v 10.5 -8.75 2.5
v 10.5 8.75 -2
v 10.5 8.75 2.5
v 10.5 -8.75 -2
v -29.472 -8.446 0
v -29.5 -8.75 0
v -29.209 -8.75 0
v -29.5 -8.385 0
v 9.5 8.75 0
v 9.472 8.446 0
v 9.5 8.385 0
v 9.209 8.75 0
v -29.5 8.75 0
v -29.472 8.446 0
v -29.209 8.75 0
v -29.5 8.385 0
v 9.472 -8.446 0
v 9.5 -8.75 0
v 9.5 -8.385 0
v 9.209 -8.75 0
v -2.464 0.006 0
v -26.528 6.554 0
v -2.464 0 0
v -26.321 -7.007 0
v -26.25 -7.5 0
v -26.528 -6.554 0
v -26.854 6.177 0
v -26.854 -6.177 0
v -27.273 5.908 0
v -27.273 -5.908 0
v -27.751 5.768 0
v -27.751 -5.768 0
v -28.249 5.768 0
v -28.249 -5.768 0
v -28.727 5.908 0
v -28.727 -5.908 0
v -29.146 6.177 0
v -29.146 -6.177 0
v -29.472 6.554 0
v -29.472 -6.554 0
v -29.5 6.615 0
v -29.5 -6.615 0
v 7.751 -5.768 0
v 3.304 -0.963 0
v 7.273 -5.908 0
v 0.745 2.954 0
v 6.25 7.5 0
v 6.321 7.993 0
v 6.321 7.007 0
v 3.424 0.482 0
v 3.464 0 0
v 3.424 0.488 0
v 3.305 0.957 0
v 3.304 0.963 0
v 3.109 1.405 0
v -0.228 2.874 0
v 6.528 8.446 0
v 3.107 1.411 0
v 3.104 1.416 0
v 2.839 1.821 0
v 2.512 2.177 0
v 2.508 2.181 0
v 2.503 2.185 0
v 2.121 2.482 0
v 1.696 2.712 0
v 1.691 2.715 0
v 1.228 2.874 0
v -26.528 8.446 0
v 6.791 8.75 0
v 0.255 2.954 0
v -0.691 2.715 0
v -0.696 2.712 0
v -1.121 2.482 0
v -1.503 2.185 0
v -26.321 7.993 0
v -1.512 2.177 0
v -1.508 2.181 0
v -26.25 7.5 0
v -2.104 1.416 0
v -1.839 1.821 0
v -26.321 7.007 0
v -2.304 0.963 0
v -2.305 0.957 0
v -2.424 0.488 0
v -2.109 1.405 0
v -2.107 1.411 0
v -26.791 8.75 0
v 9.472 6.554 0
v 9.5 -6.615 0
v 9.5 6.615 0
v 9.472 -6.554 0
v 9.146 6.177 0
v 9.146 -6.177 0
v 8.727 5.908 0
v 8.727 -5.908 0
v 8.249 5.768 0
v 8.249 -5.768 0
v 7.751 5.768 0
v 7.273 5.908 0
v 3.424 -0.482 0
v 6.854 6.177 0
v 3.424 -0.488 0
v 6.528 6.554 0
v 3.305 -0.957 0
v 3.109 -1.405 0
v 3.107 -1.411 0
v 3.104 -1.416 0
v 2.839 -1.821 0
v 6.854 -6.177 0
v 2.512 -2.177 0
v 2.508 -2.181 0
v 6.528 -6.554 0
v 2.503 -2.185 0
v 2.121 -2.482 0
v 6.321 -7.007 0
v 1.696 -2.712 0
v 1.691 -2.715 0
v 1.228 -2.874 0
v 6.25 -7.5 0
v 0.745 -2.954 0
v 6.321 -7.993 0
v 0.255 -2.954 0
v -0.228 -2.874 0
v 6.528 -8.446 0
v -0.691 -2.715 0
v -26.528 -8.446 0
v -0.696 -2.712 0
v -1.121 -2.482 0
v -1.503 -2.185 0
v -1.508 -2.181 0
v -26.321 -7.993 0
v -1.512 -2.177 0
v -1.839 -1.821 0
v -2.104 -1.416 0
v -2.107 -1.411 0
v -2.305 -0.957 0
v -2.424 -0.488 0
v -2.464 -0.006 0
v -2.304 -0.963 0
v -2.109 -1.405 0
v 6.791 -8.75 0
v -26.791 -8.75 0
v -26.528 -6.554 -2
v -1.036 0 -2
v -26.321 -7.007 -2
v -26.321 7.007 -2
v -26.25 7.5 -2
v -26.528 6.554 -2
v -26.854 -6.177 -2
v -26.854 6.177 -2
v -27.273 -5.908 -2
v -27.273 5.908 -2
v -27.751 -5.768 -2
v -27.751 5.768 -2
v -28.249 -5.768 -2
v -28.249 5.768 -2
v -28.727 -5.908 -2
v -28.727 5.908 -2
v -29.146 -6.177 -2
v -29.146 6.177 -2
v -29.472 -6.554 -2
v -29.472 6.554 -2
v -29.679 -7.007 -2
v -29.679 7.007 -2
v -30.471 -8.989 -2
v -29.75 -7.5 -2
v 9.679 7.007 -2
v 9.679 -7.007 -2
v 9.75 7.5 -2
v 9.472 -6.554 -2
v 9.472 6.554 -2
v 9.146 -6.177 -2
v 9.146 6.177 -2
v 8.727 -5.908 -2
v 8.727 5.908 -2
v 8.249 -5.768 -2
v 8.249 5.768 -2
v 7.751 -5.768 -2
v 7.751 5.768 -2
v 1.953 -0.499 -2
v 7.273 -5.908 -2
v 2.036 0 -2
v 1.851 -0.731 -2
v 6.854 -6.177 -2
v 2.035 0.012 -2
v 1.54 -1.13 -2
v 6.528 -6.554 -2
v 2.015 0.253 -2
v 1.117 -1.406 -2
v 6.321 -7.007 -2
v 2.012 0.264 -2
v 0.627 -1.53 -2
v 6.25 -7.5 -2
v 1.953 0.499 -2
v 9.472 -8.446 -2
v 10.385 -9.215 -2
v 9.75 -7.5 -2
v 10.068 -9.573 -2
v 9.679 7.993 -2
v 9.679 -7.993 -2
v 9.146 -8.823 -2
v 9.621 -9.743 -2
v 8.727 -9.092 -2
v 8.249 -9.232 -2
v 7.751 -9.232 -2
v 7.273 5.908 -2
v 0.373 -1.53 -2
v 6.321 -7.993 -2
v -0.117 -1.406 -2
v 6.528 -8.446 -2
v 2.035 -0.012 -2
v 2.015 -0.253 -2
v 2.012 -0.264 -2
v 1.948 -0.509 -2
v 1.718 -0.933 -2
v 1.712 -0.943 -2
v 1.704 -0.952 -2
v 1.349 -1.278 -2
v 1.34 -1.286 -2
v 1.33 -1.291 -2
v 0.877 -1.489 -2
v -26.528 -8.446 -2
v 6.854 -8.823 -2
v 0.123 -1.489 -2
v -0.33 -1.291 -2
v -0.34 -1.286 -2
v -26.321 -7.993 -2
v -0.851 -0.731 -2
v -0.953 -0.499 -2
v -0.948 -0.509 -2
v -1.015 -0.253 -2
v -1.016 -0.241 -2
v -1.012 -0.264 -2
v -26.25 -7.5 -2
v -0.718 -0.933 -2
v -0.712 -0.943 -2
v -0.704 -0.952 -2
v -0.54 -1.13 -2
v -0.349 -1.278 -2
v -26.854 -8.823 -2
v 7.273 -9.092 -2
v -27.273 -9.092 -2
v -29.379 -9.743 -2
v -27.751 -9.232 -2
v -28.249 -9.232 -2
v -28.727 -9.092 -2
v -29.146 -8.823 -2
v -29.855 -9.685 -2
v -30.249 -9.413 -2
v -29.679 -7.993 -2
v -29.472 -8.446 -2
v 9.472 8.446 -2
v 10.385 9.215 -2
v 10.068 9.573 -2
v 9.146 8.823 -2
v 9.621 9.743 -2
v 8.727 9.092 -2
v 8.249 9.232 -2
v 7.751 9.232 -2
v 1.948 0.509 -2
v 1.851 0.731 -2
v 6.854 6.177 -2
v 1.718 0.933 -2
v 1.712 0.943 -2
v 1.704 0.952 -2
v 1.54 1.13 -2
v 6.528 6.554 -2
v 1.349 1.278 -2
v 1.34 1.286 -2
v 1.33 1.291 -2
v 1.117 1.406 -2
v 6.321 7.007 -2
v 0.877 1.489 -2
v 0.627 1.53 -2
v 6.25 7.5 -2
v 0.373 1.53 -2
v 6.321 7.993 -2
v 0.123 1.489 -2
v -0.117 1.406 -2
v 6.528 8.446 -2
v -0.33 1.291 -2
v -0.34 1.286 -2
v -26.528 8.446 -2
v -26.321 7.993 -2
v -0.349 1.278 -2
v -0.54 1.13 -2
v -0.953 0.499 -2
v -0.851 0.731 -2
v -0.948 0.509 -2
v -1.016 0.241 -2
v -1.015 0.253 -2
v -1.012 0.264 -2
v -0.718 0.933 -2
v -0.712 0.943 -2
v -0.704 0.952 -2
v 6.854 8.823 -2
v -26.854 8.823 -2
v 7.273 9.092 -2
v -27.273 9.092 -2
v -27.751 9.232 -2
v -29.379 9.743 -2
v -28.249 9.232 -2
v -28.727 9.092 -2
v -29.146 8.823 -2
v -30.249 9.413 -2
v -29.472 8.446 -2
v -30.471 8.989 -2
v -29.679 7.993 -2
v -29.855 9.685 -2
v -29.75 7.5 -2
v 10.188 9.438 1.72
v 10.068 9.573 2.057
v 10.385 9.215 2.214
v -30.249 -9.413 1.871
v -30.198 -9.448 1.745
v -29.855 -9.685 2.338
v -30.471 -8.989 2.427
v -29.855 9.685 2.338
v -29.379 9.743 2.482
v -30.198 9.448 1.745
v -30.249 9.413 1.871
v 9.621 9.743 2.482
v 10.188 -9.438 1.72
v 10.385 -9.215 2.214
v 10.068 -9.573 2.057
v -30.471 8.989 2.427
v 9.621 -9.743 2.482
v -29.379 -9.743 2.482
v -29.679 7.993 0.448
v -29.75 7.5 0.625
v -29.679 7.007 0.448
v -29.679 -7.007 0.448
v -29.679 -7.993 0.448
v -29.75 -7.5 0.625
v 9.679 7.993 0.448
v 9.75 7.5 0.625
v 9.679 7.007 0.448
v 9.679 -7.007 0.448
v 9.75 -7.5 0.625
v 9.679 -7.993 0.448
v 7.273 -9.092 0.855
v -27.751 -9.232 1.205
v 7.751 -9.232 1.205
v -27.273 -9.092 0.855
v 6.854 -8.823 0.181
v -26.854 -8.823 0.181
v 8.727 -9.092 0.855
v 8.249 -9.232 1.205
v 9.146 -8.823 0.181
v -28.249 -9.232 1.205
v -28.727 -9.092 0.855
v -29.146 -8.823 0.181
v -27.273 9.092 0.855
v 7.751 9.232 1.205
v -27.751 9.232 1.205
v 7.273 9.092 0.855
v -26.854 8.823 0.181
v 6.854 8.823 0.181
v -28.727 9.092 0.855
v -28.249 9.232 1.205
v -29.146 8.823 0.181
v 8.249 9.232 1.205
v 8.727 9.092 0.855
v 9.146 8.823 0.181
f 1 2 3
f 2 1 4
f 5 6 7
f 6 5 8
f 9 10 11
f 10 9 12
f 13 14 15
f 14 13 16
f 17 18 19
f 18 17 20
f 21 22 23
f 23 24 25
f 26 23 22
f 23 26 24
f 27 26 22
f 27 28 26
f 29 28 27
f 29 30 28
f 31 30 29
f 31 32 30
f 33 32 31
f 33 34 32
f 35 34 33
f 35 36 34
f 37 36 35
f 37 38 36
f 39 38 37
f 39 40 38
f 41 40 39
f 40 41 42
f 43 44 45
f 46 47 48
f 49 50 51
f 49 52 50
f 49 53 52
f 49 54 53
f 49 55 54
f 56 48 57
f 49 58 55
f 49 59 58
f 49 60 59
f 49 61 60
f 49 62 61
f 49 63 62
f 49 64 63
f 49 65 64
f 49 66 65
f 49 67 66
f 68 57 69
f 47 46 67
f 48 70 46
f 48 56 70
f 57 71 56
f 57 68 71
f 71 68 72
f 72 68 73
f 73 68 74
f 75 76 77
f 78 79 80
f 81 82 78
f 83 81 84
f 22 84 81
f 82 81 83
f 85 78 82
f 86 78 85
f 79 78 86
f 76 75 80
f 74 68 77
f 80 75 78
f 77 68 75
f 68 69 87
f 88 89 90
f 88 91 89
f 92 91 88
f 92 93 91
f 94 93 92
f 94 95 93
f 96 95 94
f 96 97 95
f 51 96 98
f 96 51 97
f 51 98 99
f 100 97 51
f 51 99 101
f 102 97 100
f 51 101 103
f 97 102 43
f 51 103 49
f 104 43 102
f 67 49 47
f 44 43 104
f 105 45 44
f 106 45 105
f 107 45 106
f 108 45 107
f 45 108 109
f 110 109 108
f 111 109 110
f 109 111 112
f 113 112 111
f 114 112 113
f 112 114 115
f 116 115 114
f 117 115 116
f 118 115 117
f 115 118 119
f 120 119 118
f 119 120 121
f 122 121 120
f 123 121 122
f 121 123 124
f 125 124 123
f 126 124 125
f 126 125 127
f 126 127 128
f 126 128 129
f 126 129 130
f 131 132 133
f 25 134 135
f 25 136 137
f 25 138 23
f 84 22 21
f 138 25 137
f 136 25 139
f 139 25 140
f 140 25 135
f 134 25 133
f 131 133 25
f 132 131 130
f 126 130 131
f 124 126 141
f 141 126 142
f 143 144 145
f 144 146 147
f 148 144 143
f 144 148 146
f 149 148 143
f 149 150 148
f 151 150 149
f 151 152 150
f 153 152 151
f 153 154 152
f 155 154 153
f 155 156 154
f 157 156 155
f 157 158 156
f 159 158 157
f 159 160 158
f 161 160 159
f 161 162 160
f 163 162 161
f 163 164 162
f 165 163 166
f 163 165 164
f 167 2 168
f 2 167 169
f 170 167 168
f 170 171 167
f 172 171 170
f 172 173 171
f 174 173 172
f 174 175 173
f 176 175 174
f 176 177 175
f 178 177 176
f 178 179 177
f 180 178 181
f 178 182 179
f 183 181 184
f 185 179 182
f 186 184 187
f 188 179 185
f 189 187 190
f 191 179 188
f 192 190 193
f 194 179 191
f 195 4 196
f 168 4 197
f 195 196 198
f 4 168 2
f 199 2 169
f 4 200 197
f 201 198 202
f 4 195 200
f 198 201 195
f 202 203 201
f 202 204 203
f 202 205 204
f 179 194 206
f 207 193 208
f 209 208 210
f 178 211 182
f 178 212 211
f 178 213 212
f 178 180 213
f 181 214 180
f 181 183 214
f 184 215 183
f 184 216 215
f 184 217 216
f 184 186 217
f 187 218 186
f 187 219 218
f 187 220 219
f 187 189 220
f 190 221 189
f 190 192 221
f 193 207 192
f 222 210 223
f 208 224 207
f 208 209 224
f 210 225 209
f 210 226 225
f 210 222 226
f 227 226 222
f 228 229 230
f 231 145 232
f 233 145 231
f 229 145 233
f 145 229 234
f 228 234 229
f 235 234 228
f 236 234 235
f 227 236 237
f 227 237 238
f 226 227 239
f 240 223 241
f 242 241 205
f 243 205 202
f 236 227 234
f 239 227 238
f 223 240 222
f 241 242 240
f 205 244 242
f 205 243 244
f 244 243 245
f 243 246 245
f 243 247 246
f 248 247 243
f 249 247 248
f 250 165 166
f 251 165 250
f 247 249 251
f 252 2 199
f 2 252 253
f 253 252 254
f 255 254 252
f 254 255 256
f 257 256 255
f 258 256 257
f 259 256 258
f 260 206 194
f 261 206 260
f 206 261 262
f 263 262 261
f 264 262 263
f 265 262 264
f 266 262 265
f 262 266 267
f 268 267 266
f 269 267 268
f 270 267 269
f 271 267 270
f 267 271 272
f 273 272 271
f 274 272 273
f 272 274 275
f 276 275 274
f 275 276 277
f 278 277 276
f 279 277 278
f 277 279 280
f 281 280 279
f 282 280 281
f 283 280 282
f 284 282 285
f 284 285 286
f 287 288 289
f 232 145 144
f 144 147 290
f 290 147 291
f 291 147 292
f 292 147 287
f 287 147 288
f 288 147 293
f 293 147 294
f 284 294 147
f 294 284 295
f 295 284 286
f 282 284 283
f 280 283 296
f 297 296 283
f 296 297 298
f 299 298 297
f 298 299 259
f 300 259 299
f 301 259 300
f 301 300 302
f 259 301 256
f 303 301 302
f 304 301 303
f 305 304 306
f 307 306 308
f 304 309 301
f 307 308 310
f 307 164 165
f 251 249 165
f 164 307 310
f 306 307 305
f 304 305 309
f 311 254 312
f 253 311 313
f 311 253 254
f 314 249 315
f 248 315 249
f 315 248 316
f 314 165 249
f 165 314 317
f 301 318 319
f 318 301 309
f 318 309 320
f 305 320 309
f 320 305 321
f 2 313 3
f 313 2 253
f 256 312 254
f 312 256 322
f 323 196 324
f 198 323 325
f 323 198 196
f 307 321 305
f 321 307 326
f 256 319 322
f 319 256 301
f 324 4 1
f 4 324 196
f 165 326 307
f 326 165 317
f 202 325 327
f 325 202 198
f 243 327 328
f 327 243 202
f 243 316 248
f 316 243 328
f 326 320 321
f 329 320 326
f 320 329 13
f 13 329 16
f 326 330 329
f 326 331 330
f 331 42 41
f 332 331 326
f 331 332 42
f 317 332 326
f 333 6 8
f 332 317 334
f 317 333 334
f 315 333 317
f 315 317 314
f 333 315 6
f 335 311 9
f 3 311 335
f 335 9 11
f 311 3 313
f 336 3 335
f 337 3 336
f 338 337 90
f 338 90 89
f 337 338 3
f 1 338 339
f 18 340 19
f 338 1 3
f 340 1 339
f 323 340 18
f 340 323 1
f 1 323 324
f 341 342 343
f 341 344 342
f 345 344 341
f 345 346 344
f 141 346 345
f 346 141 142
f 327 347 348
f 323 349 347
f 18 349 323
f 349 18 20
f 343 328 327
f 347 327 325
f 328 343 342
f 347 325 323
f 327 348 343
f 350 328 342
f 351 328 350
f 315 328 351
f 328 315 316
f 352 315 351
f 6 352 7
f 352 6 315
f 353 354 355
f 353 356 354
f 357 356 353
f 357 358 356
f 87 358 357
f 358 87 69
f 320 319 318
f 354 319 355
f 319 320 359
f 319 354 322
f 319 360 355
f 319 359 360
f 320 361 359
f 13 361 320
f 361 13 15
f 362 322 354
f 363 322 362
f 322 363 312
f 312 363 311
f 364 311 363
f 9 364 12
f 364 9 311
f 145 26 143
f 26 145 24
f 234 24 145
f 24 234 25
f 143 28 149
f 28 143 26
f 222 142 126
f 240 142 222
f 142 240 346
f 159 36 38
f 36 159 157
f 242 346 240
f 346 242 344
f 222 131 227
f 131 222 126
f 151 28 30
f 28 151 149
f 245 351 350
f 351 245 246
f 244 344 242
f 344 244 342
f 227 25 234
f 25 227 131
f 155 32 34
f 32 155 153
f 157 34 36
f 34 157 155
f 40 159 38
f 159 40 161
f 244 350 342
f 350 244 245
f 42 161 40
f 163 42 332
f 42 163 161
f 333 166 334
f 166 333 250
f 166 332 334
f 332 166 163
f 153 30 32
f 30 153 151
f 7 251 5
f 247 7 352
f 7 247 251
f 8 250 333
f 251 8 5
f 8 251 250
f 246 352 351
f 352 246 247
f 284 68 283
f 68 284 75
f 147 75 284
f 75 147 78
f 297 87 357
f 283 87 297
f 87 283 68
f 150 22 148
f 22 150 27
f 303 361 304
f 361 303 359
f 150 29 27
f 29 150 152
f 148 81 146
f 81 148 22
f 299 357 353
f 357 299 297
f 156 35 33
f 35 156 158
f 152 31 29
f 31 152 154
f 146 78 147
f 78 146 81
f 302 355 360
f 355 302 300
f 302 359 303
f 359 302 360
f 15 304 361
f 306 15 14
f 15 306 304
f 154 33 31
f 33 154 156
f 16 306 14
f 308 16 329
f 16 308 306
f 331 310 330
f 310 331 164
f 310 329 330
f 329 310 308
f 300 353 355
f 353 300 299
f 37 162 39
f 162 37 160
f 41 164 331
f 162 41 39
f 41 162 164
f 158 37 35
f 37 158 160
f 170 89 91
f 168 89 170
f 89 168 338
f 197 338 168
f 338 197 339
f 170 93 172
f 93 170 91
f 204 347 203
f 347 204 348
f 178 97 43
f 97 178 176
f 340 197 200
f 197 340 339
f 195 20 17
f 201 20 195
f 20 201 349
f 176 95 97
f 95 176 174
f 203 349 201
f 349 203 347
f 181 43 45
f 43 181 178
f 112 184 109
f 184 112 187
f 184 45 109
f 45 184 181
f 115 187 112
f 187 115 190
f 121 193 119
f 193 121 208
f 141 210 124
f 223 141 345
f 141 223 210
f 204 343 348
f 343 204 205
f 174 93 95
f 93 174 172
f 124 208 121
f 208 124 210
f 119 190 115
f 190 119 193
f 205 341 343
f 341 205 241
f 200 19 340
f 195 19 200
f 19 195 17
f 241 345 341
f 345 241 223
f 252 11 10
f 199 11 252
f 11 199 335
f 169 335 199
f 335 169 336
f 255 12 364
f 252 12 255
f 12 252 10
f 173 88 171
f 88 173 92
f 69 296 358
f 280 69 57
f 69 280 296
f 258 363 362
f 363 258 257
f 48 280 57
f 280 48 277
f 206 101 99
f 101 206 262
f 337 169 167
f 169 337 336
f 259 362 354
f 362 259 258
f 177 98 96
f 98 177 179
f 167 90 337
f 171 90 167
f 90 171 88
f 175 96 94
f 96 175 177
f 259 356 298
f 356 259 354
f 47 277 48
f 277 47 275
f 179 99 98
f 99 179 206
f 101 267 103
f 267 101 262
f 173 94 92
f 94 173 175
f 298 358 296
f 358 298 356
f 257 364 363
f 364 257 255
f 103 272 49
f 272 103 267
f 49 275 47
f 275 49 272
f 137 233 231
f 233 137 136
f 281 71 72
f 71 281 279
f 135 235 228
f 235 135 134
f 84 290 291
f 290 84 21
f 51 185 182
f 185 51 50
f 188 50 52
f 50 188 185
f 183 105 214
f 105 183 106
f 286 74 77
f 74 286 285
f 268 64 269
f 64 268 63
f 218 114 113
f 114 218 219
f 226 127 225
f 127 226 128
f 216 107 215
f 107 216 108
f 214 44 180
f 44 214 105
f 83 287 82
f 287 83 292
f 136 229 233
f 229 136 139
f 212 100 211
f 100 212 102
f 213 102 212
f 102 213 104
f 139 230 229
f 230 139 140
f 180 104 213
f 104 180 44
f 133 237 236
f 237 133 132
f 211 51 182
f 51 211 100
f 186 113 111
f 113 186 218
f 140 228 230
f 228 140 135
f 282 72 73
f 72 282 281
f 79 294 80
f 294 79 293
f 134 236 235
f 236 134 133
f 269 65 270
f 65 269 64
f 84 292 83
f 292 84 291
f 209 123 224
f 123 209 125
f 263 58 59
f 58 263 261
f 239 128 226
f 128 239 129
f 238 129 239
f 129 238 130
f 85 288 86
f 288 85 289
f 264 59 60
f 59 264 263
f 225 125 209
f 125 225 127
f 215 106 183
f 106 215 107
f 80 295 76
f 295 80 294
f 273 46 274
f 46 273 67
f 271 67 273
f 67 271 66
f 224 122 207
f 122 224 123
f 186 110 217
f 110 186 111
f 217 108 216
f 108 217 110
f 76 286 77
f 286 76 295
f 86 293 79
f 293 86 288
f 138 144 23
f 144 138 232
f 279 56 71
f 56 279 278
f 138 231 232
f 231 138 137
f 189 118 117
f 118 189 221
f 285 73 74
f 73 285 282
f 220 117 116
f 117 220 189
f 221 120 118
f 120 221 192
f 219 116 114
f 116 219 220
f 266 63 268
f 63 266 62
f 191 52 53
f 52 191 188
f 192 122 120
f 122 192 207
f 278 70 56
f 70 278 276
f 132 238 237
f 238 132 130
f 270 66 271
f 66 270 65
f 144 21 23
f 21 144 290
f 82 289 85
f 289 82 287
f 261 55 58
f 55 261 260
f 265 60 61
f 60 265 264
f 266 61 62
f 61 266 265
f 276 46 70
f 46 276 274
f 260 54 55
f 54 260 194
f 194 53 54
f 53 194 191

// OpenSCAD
// file: ../lib/bearing.scad
/*
 * Bearing model.
 *
 * Originally by Hans Häggström, 2010.
 * Modified by Frédéric Mantegazza (2015)
 *
 * Dual licenced under Creative Commons Attribution-Share Alike 3.0 and LGPL2 or later
 */

EPSILON = 0.01;


BEARING_INNER_DIAMETER = 0;
BEARING_OUTER_DIAMETER = 1;
BEARING_WIDTH = 2;


// Bearing dimensions
// model == XXX ? [inner dia, outer dia, width]:
function bearingDimensions(model) =
    model == 683 ? [3, 7, 2]:
    model == "MR83" ? [3, 8, 3]:
    model ==  623 ? [ 3, 10, 4]:
    model ==  624 ? [ 4, 13, 5]:
    model ==  684 ? [ 5, 11, 5]:  // or [4, 9, 4]: ???
    model == "MR105" ? [5, 10, 3]:
    model == "MR115" ? [5, 11, 4]:
    model ==  695 ? [ 5, 13, 4]:
    model ==  605 ? [ 5, 14, 5]:
    model ==  625 ? [ 5, 16, 5]:
    model ==  106 ? [ 6, 10, 3]:
    model ==  126 ? [ 6, 12, 4]:
    model ==  696 ? [6, 15, 5]:
    model ==  626 ? [6, 19, 6]:
    model ==  627 ? [ 7, 22, 7]:
    model ==  688 ? [ 8, 16, 4]:
    model ==  698 ? [ 8, 19, 6]:
    model ==  608 ? [ 8, 22, 7]:
    model == 6700 ? [10, 16, 4]:
    model == 6800 ? [10, 19, 5]:
    model == 6900 ? [10, 22, 6]:
    model == 6701 ? [12, 18, 4]:
    model == 6801 ? [12, 21, 5]:
    model == 6901 ? [12, 24, 6]:
    model == 6702 ? [15, 21, 4]:
    model == 6703 ? [17, 23, 4]:
    [8, 22, 7]; // this is the default


function bearing_d(model) = bearingDimensions(model)[BEARING_INNER_DIAMETER];
function bearing_D(model) = bearingDimensions(model)[BEARING_OUTER_DIAMETER];
function bearing_w(model) = bearingDimensions(model)[BEARING_WIDTH];


module _bearing(d, D, w, pos, rot) {

    module ring(D, d, w) {
        difference() {
            cylinder(r=D/2, h=w, $fs=0.1);
            translate([0,0,-EPSILON]) {
                cylinder(r=d/2, h=w+2*EPSILON, $fs=0.1);
            }
        }
    }

    inner_rim = d + (D - d) * 0.25;
    outer_rim = D - (D - d) * 0.25;
    mid_sink = w * 0.1;

    translate(pos) rotate(rot) {
        difference() {
            ring(D, d, w);
            translate([0, 0, -EPSILON]) {
                ring(outer_rim, inner_rim, mid_sink+EPSILON);
            }
            translate([0, 0, w-mid_sink]) {
                ring(outer_rim, inner_rim, mid_sink+EPSILON);
            }
        }
    }
}


module bearing(model, pos=[0,0,0], rot=[0,0,0]) {
    d = bearing_d(model);
    D = bearing_D(model);
    w = bearing_w(model);
//    color([0.5, 0.5, 0.5]) {
        _bearing(d, D, w, pos, rot);
//    }
}


bearing(model=608, pos=[10, 10, 10], rot=[0, 90, 45]);
// file: ../lib/rounded_cube.scad
// Cube with rounded edges on all sides
// The first parameters defines the size of the cube (array)
// The second parameter defines the edges radius along each axis (array)
//
// Thanks to hagen from OpenSCAD mailing list for this optimize solution

//rcube(size=[25, 25, 10], radius=[1, 1, 5], center=true, $fn=32);


module _rsquare(size=[1, 1], radius=0) {
    assign(sx=size[0], sy=size[1], r=min(radius, size[0]/2, size[1]/2)) {
        if (r == 0) {
            square(size=[sx, sy], center=true);  // not rounded
        }
        else {
            hull() {
                for (corner=[[sx/2-r, sy/2-r], [-sx/2+r, sy/2-r], [sx/2-r, -sy/2+r], [-sx/2+r, -sy/2+r]]) {
                    translate(corner) {
                        circle(r=r);
                    }
                }
            }
        }
    }
}


module _rcube(size=[1, 1, 1], radius=[0, 0, 0]) {
    assign(sx=size[0], sy=size[1], sz=size[2], rx=radius[0], ry=radius[1], rz=radius[2]) {
        translate([sx/2, sy/2, sz/2]) {
            intersection() {
                rotate([90, 0, 0]) {
                    rotate([0, 90, 0]) {
                        linear_extrude(height=sx, center=true) {
                            _rsquare(size=[sy, sz], radius=rx);
                        }
                    }
                }
                rotate([90, 0, 0]) linear_extrude(height=sy, center=true) {
                    _rsquare(size=[sx, sz], radius=ry);
                }
                linear_extrude(height=sz, center=true) {
                    _rsquare(size=[sx, sy], radius=rz);
                }
            }
        }
    }
}


module rcube(size=[1, 1, 1], radius=[0, 0, 0], center=true) {
    if (!center) {
        _rcube(size=size, radius=radius);
    }
    else {
        assign(sx=size[0], sy=size[1], sz=size[2]) {
            translate([-sx/2, -sy/2, -sz/2]) {
                _rcube(size, radius=radius);
            }
        }
    }
}


//module rcube(size=[1, 1, 1], radius=[0, 0, 0], center=true) {
//    assign(sx=size[0], sy=size[1], sz=size[2], rx=radius[0], ry=radius[1], rz=radius[2]) {
//        intersection() {
//
//            // Radius on X axis
//            rotate([0, 90, 0])
//            linear_extrude(height=sx, center=center) {
//                minkowski() {
//                    square([sz-2*rx, sy-2*rx], center=center);
//                    scale([rx, rx]) circle(1);
//                }
//            }
//
//            // Radius on Y axis
//            rotate([90, 0, 0])
//            linear_extrude(height=sy, center=center) {
//                minkowski() {
//                    square([sx-2*ry, sz-2*ry], center=center);
//                    scale([ry, ry]) circle(1);
//                }
//            }
//
//            // Radius on Z axis
//            linear_extrude(height=sz, center=center) {
//                minkowski() {
//                    square([sx-2*rz, sy-2*rz], center=center);
//                    scale([rz, rz]) circle(1);
//                }
//            }
//        }
//    }
//}
// main file
use <../lib/rounded_cube.scad>
use <../lib/bearing.scad>

SERVO_L = 41.0;
SERVO_W = 19.5;

CHAMFER_W = 1;
CHAMFER_H = 2.5;

BOTTOM_T = 2.0;

SCREWS_X = 36.0;
SCREWS_Y = 15.0;
SCREWS_HEAD_D = 3.5;

SHAFT_POS_X = 20.0 / 2;

$fs=0.5;
$fa=2.5;


module chamfer(w=1, h=1, l=10, center=true)
{
    rotate([90, 0, 0]) {
        linear_extrude(height=l, center=center) {
            polygon(points=[[0, 0], [w, 0], [0, h]]);
        }
    }
}


module servo_lid()
{
    translate([-SHAFT_POS_X, 0, 0])
    difference() {
        union() {
            
            // bottom
            translate([0, 0, -BOTTOM_T/2]) {
                rcube([SERVO_L, SERVO_W, BOTTOM_T], [0, 0, 1], center=true);
            }

            // chanfrein
            intersection() {
                translate([0, 0, CHAMFER_H/2]) {
                    rcube([SERVO_L, SERVO_W, CHAMFER_H], [0, 0, 1], center=true);
                }
                union() {
                    translate([-SERVO_L/2, 0, 0]) {
                        chamfer(w=CHAMFER_W, h=CHAMFER_H, l=SERVO_W, center=true);
                    }
                    translate([SERVO_L/2, 0, 0]) {
                        mirror([1, 0, 0]) {
                            chamfer(w=CHAMFER_W, h=CHAMFER_H, l=SERVO_W, center=true);
                        }
                    }
                    translate([0, -SERVO_W/2, 0]) {
                        rotate([0, 0, 90]) {
                            chamfer(w=CHAMFER_W, h=CHAMFER_H, l=SERVO_L, center=true);
                        }
                    }
                    translate([0, SERVO_W/2, 0]) {
                        rotate([0, 0, -90]) {
                            chamfer(w=CHAMFER_W, h=CHAMFER_H, l=SERVO_L, center=true);
                        }
                    }
                }
            }
        }
        
        // screws holes
        for (x=[-SCREWS_X/2, SCREWS_X/2]) {
            for (y=[-SCREWS_Y/2, SCREWS_Y/2]) {
                translate([x, y, -BOTTOM_T-0.05]) {
                    cylinder(d=SCREWS_HEAD_D, h=BOTTOM_T+CHAMFER_H+0.1, center=false);
                }
            }
        }
        
        // screw bearing hole
        translate([SERVO_L/2-SHAFT_POS_X, 0, -BOTTOM_T-0.05]) {
            difference() {
                cylinder(d1=3, d2=6, h=BOTTOM_T+0.1, center=false);
            }
        }
    }
}


module servo_lid_vitamins()
{
    translate([0, 0, -BOTTOM_T-bearing_w(623)-0.5]) {
        bearing(623);
    }
}


servo_lid();
%servo_lid_vitamins();
